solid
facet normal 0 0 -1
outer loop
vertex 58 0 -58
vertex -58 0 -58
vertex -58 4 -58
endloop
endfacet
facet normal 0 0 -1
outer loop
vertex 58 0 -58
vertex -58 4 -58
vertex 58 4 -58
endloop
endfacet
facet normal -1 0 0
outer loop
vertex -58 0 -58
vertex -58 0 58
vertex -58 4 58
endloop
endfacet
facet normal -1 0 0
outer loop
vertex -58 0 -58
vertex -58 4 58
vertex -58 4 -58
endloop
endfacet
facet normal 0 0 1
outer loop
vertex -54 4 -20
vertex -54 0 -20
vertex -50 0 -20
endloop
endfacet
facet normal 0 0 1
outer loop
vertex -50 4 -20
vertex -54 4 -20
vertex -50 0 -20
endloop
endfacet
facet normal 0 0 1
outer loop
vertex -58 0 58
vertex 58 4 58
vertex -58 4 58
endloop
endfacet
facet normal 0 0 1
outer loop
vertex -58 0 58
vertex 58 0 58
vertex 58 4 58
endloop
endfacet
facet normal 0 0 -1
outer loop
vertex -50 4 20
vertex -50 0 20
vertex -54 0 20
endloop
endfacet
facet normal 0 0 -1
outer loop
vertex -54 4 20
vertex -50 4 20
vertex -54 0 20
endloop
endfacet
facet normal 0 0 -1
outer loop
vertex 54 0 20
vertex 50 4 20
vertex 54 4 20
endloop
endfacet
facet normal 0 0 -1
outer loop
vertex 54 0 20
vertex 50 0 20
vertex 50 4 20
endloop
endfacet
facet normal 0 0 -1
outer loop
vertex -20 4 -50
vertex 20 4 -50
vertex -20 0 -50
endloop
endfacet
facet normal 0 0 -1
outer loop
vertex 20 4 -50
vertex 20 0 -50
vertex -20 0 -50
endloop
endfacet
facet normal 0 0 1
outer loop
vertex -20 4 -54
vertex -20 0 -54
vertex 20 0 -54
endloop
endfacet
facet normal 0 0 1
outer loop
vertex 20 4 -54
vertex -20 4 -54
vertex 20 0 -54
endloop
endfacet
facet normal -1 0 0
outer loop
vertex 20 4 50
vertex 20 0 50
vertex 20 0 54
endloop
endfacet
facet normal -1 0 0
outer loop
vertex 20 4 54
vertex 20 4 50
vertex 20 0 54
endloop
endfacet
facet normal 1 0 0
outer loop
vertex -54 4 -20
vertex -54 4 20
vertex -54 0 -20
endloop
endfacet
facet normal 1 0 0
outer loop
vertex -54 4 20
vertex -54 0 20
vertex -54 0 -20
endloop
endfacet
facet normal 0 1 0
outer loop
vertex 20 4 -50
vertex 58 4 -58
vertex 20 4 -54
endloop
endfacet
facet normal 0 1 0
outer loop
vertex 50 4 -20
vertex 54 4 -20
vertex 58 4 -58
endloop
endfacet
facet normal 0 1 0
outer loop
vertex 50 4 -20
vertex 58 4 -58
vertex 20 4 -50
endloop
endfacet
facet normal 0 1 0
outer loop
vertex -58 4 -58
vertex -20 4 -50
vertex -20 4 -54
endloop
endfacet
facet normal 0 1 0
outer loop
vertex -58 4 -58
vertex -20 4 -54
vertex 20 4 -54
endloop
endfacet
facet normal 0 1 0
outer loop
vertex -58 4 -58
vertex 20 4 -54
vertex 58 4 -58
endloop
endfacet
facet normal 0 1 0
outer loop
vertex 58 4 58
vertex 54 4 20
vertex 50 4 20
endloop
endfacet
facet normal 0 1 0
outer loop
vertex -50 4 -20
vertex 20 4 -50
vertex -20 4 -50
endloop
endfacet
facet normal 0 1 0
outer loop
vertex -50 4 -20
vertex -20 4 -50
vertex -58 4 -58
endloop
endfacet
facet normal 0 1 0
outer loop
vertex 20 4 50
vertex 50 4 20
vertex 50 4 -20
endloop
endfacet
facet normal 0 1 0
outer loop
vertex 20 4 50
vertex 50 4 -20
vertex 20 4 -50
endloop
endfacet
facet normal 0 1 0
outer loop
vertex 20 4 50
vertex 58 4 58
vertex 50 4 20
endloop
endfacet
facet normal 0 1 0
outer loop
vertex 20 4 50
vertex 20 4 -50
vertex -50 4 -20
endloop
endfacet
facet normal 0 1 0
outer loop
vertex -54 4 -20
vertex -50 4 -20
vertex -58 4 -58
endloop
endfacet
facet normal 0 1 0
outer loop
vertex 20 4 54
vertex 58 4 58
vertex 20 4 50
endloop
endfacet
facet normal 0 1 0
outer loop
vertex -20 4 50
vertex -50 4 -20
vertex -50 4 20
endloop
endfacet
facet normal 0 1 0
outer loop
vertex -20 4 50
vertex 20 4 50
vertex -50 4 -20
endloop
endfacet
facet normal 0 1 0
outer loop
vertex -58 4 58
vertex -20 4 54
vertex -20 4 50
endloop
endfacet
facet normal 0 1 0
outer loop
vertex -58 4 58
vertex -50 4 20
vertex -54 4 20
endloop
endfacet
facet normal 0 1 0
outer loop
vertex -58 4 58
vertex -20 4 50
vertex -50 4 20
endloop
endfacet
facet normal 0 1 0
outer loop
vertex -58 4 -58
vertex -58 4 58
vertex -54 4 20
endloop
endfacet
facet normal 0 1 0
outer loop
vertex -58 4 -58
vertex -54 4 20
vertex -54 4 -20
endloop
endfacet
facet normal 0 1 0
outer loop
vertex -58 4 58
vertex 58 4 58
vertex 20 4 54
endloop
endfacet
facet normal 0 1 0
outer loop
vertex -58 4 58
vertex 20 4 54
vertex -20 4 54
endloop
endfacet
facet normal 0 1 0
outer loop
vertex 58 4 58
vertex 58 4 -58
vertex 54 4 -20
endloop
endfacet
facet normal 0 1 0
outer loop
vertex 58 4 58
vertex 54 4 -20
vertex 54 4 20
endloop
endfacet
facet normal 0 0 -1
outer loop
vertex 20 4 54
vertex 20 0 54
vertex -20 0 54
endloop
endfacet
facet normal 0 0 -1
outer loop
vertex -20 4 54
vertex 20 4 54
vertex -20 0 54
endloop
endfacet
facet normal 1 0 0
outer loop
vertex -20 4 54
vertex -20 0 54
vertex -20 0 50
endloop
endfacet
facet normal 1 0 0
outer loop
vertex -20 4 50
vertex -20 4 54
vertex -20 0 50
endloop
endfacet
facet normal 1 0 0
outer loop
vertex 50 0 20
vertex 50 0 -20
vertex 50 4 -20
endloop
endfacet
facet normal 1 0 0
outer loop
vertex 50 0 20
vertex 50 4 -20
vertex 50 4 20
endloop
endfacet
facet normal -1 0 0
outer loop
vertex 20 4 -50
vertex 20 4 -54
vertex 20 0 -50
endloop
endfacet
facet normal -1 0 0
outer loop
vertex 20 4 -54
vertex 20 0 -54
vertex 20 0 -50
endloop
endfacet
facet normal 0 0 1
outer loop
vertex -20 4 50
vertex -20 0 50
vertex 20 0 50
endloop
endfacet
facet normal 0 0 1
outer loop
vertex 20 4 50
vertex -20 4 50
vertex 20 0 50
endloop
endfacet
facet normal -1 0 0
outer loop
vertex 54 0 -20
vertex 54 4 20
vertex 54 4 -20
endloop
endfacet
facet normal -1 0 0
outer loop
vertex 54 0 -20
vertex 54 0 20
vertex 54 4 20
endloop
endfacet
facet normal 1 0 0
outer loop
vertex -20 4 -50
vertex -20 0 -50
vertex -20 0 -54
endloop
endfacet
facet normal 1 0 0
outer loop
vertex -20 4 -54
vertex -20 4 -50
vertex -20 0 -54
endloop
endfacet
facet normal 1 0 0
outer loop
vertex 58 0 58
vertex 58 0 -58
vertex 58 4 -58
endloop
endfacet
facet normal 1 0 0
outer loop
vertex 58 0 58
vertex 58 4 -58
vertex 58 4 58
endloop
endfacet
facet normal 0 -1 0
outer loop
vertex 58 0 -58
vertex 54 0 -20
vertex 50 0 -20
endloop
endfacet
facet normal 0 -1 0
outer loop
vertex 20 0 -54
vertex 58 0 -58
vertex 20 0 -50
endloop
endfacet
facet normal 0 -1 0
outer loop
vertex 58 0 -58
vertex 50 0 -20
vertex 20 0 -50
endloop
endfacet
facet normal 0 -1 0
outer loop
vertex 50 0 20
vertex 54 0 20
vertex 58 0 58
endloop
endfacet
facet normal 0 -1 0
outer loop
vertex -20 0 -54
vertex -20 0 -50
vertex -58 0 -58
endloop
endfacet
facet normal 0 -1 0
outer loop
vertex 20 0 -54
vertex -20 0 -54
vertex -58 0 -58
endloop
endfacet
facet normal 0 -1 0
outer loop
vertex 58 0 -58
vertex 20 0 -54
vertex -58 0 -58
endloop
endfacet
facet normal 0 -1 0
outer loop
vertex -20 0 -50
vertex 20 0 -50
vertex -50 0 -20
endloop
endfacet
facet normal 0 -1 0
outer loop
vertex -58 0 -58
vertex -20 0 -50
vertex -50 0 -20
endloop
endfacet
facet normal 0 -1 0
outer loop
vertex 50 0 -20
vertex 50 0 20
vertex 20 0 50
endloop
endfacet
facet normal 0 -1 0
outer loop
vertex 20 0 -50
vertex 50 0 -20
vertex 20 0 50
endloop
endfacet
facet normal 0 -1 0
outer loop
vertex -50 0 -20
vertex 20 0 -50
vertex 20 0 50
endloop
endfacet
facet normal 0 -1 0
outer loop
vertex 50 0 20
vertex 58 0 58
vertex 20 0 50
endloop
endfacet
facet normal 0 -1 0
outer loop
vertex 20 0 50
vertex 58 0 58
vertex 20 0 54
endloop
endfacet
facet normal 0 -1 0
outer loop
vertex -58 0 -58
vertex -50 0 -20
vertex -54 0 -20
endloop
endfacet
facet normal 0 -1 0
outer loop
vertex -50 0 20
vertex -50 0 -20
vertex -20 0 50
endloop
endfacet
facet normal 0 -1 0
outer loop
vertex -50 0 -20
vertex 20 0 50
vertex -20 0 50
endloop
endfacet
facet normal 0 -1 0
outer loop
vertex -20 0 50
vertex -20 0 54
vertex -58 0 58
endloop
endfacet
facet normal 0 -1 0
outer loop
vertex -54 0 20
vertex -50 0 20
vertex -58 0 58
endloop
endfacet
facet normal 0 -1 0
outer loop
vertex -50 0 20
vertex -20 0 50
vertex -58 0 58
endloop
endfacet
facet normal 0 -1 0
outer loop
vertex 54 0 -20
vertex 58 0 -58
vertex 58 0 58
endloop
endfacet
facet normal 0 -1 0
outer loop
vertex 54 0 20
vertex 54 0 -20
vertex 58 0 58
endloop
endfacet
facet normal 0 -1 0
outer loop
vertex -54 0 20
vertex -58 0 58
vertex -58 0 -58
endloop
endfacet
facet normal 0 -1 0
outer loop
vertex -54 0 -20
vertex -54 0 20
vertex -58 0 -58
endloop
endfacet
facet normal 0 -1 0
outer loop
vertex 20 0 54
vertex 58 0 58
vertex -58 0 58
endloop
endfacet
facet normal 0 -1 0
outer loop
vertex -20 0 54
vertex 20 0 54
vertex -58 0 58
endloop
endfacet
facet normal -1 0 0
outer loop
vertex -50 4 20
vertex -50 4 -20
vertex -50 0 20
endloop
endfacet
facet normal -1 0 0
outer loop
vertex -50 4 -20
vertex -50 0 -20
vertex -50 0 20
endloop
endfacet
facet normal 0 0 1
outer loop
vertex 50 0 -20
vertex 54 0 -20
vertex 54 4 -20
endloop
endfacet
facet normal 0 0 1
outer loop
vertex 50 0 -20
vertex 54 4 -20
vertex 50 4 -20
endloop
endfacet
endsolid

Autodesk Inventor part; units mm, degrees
ref_plane "YZ Plane" through (0, 0, 0) normal (1, 0, 0) x (0, 1, 0)
ref_plane "XZ Plane" through (0, 0, 0) normal (0, 1, 0) x (-1, 0, 0)
ref_plane "XY Plane" through (0, 0, 0) normal (0, 0, 1) x (1, 0, 0)
sketch "Sketch1" plane through (0, 0, 0) normal (0, 1, 0) x (-1, 0, 0)
  line L0 (50, -50) -> (-50, -50) construction
  line L1 (-50, -50) -> (-50, 50) construction
  line L2 (-50, 50) -> (50, 50) construction
  line L3 (50, 50) -> (50, -50) construction
  line L4 (54, -54) -> (-54, -54) construction
  line L5 (-54, -54) -> (-54, 54) construction
  line L6 (-54, 54) -> (54, 54) construction
  line L7 (54, 54) -> (54, -54) construction
  line L8 (58, -58) -> (-58, -58)
  line L9 (-58, -58) -> (-58, 58)
  line L10 (-58, 58) -> (58, 58)
  line L11 (58, 58) -> (58, -58)
  line L12 (54, -20) -> (50, -20)
  line L13 (50, -20) -> (50, 20)
  line L14 (50, 20) -> (54, 20)
  line L15 (54, 20) -> (54, -20)
  line L16 (-50, 20) -> (-54, 20)
  line L17 (-54, 20) -> (-54, -20)
  line L18 (-54, -20) -> (-50, -20)
  line L19 (-50, -20) -> (-50, 20)
  line L20 (-20, -50) -> (20, -50)
  line L21 (20, -50) -> (20, -54)
  line L22 (20, -54) -> (-20, -54)
  line L23 (-20, -54) -> (-20, -50)
  line L24 (20, 50) -> (-20, 50)
  line L25 (-20, 50) -> (-20, 54)
  line L26 (-20, 54) -> (20, 54)
  line L27 (20, 54) -> (20, 50)
  point P0 (0, 0)
  point P1 (0, -50)
  point P2 (50, 0)
  point P3 (50, 0)
  point P4 (0, -50)
  point P5 (52, 20)
  point P6 (52, -20)
  dimension "d0" = 4
  dimension "d1" = 4
  dimension "d2" = 100
  dimension "d3" = 100
  dimension "d4" = 40
extrude "Extrusion1" add sketch "Sketch1" along normal blind 4
properties part number "Top_100wx100d" material "Wood (Oak)"
